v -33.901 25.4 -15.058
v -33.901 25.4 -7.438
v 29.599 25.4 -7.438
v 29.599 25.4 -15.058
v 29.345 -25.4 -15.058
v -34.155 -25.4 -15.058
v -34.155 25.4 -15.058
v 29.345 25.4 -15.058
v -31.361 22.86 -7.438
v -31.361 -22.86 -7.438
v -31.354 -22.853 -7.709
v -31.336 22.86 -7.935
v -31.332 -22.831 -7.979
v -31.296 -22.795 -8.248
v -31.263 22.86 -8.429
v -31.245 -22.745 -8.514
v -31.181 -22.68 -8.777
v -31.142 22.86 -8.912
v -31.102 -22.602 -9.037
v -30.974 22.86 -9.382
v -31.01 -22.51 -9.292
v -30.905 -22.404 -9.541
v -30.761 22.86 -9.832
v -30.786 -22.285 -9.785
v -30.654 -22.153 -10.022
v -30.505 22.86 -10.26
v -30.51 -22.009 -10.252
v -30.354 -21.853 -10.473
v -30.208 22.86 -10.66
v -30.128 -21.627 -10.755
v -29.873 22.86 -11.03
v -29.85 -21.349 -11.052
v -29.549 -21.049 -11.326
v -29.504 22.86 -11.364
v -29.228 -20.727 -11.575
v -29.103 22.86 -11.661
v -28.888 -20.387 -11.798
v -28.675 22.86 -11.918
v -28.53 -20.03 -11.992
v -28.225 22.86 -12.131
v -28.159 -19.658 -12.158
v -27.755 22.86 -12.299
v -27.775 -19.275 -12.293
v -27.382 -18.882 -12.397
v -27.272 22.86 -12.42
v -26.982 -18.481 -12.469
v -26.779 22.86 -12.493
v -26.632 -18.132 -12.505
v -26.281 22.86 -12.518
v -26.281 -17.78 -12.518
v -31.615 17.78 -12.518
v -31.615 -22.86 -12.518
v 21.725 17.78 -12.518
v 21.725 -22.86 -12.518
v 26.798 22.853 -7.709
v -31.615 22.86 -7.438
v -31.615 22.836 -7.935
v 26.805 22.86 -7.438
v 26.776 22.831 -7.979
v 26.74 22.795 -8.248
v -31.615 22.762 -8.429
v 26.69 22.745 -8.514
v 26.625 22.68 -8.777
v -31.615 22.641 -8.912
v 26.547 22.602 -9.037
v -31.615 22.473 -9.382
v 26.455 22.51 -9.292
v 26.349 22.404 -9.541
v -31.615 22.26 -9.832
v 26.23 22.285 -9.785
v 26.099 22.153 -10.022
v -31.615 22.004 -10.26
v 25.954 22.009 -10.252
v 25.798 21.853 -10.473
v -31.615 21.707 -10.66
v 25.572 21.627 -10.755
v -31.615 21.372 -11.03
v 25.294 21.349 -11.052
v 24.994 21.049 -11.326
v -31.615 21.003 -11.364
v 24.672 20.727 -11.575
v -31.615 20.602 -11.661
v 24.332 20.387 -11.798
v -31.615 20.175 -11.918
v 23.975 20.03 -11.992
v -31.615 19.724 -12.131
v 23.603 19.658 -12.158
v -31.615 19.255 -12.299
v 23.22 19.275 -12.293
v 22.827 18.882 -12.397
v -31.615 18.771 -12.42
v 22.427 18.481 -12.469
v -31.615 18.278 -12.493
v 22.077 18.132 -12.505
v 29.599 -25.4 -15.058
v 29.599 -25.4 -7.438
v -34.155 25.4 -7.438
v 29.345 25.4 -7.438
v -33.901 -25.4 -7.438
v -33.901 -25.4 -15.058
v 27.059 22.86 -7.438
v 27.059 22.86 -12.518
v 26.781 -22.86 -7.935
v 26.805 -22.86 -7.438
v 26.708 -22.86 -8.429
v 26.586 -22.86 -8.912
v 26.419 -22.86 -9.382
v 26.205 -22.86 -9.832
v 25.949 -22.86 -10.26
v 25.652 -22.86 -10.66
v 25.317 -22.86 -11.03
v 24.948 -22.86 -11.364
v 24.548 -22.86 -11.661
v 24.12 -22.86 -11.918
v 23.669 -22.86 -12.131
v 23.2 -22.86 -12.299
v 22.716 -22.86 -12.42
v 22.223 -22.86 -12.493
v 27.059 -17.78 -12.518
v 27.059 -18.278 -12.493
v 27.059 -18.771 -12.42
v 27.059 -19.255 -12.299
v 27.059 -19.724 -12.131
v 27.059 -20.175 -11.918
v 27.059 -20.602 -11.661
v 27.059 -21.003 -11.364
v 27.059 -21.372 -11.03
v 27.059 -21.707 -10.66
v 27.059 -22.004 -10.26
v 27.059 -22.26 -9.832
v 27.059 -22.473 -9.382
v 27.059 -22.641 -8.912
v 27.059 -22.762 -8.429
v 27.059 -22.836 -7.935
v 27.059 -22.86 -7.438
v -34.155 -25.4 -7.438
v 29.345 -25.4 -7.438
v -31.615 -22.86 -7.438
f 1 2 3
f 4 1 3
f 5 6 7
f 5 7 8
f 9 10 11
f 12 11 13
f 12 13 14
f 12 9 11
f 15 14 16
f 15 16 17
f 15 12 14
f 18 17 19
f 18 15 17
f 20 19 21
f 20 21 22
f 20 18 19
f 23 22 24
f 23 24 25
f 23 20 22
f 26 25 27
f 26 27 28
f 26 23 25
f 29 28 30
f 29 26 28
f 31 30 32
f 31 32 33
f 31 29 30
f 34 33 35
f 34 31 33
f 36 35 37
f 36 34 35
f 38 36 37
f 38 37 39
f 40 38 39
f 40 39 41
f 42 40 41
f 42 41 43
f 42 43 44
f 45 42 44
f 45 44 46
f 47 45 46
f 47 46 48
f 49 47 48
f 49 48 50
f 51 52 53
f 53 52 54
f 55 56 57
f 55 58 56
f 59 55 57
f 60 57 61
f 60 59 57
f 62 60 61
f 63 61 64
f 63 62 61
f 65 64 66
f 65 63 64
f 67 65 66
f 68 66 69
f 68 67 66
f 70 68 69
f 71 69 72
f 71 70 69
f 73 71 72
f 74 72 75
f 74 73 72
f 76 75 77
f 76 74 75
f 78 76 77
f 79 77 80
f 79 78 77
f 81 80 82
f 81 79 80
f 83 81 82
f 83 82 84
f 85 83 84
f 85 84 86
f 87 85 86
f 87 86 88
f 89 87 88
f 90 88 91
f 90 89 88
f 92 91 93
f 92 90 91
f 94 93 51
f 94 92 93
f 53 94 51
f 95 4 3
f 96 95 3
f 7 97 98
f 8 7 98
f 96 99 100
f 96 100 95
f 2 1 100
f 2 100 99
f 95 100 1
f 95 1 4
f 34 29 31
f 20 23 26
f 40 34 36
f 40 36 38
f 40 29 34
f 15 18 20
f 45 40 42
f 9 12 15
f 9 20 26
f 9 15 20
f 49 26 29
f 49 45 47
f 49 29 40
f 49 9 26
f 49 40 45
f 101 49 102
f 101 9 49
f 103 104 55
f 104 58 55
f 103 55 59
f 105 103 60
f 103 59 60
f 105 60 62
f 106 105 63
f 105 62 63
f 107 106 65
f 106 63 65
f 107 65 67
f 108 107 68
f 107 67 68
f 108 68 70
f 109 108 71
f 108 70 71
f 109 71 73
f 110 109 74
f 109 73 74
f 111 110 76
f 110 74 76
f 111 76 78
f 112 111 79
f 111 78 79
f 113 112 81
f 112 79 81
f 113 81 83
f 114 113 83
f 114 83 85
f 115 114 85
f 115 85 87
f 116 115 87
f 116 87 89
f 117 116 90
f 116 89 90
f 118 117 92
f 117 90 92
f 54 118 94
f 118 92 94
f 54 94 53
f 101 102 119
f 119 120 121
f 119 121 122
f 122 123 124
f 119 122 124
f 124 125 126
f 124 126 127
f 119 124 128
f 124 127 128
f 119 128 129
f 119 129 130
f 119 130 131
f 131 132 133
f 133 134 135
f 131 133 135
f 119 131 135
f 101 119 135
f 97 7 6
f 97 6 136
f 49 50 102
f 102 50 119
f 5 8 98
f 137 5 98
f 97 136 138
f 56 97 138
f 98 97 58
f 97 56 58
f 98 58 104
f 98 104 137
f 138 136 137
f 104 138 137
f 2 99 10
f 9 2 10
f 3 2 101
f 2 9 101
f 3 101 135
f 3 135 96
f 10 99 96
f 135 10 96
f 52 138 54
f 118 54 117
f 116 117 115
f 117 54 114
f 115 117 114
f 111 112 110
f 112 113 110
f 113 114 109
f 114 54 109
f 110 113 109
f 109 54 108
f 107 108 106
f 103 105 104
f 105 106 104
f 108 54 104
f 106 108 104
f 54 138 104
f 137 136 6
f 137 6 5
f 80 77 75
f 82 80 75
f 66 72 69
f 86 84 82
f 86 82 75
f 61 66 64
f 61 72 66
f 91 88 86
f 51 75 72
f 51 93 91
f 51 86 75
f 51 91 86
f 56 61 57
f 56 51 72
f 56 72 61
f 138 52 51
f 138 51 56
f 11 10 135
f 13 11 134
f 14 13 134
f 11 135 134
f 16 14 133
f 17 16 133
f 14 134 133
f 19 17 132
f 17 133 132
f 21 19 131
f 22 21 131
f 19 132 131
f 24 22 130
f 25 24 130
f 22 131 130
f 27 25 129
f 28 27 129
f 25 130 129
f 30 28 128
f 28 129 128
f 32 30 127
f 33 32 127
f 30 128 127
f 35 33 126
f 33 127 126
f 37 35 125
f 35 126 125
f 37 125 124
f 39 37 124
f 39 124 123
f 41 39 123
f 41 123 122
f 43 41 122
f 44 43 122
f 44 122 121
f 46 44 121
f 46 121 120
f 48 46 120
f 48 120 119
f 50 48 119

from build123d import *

# Parameters (mm, degrees)
F0_W     = 63.5
F0_H     = 7.62
F1_DEPTH = 25.4
F2_T     = -2.54
F4_R     = 5.07999
F4_2_R   = 5.07999


# Not quite as in the source:
# - a fillet or chamfer is up to 0.001 mm smaller than in the source, because OpenCascade refuses the exact size


with BuildPart() as f1:
    # F0 (on Front) → F1 (new body, symmetric)
    with BuildSketch(Plane.XZ):
        with Locations((-2.1507982165, -11.2475522422)):
            Rectangle(F0_W, F0_H)
    extrude(amount=F1_DEPTH, both=True)

    # F2
    f2_openings = [f1.faces().sort_by_distance(p)[0] for p in [
        (-2.150798, 0, -7.437552),
    ]]
    offset(amount=F2_T, openings=f2_openings)


with BuildPart() as f3_1:
    # F3: copy of F1
    add(f1.part.moved(Location((-0.254, 0, 0))))

    # F4#2 (radius 5.08 in the source; OpenCascade refuses exactly that, so slightly less here)
    f4_2_edges = [f3_1.edges().sort_by_distance(p)[0] for p in [
        (-2.404798, 22.86, -12.517552),
        (26.805202, 0, -12.517552),
    ]]
    fillet(f4_2_edges, radius=F4_2_R)


with BuildPart() as f1_1:
    add(f1.part)

    # F4 (radius 5.08 in the source; OpenCascade refuses exactly that, so slightly less here)
    f4_edges = [f1_1.edges().sort_by_distance(p)[0] for p in [
        (-31.360798, 0, -12.517552),
        (-2.150798, -22.86, -12.517552),
    ]]
    fillet(f4_edges, radius=F4_R)


solid = Compound([f3_1.part, f1_1.part])
